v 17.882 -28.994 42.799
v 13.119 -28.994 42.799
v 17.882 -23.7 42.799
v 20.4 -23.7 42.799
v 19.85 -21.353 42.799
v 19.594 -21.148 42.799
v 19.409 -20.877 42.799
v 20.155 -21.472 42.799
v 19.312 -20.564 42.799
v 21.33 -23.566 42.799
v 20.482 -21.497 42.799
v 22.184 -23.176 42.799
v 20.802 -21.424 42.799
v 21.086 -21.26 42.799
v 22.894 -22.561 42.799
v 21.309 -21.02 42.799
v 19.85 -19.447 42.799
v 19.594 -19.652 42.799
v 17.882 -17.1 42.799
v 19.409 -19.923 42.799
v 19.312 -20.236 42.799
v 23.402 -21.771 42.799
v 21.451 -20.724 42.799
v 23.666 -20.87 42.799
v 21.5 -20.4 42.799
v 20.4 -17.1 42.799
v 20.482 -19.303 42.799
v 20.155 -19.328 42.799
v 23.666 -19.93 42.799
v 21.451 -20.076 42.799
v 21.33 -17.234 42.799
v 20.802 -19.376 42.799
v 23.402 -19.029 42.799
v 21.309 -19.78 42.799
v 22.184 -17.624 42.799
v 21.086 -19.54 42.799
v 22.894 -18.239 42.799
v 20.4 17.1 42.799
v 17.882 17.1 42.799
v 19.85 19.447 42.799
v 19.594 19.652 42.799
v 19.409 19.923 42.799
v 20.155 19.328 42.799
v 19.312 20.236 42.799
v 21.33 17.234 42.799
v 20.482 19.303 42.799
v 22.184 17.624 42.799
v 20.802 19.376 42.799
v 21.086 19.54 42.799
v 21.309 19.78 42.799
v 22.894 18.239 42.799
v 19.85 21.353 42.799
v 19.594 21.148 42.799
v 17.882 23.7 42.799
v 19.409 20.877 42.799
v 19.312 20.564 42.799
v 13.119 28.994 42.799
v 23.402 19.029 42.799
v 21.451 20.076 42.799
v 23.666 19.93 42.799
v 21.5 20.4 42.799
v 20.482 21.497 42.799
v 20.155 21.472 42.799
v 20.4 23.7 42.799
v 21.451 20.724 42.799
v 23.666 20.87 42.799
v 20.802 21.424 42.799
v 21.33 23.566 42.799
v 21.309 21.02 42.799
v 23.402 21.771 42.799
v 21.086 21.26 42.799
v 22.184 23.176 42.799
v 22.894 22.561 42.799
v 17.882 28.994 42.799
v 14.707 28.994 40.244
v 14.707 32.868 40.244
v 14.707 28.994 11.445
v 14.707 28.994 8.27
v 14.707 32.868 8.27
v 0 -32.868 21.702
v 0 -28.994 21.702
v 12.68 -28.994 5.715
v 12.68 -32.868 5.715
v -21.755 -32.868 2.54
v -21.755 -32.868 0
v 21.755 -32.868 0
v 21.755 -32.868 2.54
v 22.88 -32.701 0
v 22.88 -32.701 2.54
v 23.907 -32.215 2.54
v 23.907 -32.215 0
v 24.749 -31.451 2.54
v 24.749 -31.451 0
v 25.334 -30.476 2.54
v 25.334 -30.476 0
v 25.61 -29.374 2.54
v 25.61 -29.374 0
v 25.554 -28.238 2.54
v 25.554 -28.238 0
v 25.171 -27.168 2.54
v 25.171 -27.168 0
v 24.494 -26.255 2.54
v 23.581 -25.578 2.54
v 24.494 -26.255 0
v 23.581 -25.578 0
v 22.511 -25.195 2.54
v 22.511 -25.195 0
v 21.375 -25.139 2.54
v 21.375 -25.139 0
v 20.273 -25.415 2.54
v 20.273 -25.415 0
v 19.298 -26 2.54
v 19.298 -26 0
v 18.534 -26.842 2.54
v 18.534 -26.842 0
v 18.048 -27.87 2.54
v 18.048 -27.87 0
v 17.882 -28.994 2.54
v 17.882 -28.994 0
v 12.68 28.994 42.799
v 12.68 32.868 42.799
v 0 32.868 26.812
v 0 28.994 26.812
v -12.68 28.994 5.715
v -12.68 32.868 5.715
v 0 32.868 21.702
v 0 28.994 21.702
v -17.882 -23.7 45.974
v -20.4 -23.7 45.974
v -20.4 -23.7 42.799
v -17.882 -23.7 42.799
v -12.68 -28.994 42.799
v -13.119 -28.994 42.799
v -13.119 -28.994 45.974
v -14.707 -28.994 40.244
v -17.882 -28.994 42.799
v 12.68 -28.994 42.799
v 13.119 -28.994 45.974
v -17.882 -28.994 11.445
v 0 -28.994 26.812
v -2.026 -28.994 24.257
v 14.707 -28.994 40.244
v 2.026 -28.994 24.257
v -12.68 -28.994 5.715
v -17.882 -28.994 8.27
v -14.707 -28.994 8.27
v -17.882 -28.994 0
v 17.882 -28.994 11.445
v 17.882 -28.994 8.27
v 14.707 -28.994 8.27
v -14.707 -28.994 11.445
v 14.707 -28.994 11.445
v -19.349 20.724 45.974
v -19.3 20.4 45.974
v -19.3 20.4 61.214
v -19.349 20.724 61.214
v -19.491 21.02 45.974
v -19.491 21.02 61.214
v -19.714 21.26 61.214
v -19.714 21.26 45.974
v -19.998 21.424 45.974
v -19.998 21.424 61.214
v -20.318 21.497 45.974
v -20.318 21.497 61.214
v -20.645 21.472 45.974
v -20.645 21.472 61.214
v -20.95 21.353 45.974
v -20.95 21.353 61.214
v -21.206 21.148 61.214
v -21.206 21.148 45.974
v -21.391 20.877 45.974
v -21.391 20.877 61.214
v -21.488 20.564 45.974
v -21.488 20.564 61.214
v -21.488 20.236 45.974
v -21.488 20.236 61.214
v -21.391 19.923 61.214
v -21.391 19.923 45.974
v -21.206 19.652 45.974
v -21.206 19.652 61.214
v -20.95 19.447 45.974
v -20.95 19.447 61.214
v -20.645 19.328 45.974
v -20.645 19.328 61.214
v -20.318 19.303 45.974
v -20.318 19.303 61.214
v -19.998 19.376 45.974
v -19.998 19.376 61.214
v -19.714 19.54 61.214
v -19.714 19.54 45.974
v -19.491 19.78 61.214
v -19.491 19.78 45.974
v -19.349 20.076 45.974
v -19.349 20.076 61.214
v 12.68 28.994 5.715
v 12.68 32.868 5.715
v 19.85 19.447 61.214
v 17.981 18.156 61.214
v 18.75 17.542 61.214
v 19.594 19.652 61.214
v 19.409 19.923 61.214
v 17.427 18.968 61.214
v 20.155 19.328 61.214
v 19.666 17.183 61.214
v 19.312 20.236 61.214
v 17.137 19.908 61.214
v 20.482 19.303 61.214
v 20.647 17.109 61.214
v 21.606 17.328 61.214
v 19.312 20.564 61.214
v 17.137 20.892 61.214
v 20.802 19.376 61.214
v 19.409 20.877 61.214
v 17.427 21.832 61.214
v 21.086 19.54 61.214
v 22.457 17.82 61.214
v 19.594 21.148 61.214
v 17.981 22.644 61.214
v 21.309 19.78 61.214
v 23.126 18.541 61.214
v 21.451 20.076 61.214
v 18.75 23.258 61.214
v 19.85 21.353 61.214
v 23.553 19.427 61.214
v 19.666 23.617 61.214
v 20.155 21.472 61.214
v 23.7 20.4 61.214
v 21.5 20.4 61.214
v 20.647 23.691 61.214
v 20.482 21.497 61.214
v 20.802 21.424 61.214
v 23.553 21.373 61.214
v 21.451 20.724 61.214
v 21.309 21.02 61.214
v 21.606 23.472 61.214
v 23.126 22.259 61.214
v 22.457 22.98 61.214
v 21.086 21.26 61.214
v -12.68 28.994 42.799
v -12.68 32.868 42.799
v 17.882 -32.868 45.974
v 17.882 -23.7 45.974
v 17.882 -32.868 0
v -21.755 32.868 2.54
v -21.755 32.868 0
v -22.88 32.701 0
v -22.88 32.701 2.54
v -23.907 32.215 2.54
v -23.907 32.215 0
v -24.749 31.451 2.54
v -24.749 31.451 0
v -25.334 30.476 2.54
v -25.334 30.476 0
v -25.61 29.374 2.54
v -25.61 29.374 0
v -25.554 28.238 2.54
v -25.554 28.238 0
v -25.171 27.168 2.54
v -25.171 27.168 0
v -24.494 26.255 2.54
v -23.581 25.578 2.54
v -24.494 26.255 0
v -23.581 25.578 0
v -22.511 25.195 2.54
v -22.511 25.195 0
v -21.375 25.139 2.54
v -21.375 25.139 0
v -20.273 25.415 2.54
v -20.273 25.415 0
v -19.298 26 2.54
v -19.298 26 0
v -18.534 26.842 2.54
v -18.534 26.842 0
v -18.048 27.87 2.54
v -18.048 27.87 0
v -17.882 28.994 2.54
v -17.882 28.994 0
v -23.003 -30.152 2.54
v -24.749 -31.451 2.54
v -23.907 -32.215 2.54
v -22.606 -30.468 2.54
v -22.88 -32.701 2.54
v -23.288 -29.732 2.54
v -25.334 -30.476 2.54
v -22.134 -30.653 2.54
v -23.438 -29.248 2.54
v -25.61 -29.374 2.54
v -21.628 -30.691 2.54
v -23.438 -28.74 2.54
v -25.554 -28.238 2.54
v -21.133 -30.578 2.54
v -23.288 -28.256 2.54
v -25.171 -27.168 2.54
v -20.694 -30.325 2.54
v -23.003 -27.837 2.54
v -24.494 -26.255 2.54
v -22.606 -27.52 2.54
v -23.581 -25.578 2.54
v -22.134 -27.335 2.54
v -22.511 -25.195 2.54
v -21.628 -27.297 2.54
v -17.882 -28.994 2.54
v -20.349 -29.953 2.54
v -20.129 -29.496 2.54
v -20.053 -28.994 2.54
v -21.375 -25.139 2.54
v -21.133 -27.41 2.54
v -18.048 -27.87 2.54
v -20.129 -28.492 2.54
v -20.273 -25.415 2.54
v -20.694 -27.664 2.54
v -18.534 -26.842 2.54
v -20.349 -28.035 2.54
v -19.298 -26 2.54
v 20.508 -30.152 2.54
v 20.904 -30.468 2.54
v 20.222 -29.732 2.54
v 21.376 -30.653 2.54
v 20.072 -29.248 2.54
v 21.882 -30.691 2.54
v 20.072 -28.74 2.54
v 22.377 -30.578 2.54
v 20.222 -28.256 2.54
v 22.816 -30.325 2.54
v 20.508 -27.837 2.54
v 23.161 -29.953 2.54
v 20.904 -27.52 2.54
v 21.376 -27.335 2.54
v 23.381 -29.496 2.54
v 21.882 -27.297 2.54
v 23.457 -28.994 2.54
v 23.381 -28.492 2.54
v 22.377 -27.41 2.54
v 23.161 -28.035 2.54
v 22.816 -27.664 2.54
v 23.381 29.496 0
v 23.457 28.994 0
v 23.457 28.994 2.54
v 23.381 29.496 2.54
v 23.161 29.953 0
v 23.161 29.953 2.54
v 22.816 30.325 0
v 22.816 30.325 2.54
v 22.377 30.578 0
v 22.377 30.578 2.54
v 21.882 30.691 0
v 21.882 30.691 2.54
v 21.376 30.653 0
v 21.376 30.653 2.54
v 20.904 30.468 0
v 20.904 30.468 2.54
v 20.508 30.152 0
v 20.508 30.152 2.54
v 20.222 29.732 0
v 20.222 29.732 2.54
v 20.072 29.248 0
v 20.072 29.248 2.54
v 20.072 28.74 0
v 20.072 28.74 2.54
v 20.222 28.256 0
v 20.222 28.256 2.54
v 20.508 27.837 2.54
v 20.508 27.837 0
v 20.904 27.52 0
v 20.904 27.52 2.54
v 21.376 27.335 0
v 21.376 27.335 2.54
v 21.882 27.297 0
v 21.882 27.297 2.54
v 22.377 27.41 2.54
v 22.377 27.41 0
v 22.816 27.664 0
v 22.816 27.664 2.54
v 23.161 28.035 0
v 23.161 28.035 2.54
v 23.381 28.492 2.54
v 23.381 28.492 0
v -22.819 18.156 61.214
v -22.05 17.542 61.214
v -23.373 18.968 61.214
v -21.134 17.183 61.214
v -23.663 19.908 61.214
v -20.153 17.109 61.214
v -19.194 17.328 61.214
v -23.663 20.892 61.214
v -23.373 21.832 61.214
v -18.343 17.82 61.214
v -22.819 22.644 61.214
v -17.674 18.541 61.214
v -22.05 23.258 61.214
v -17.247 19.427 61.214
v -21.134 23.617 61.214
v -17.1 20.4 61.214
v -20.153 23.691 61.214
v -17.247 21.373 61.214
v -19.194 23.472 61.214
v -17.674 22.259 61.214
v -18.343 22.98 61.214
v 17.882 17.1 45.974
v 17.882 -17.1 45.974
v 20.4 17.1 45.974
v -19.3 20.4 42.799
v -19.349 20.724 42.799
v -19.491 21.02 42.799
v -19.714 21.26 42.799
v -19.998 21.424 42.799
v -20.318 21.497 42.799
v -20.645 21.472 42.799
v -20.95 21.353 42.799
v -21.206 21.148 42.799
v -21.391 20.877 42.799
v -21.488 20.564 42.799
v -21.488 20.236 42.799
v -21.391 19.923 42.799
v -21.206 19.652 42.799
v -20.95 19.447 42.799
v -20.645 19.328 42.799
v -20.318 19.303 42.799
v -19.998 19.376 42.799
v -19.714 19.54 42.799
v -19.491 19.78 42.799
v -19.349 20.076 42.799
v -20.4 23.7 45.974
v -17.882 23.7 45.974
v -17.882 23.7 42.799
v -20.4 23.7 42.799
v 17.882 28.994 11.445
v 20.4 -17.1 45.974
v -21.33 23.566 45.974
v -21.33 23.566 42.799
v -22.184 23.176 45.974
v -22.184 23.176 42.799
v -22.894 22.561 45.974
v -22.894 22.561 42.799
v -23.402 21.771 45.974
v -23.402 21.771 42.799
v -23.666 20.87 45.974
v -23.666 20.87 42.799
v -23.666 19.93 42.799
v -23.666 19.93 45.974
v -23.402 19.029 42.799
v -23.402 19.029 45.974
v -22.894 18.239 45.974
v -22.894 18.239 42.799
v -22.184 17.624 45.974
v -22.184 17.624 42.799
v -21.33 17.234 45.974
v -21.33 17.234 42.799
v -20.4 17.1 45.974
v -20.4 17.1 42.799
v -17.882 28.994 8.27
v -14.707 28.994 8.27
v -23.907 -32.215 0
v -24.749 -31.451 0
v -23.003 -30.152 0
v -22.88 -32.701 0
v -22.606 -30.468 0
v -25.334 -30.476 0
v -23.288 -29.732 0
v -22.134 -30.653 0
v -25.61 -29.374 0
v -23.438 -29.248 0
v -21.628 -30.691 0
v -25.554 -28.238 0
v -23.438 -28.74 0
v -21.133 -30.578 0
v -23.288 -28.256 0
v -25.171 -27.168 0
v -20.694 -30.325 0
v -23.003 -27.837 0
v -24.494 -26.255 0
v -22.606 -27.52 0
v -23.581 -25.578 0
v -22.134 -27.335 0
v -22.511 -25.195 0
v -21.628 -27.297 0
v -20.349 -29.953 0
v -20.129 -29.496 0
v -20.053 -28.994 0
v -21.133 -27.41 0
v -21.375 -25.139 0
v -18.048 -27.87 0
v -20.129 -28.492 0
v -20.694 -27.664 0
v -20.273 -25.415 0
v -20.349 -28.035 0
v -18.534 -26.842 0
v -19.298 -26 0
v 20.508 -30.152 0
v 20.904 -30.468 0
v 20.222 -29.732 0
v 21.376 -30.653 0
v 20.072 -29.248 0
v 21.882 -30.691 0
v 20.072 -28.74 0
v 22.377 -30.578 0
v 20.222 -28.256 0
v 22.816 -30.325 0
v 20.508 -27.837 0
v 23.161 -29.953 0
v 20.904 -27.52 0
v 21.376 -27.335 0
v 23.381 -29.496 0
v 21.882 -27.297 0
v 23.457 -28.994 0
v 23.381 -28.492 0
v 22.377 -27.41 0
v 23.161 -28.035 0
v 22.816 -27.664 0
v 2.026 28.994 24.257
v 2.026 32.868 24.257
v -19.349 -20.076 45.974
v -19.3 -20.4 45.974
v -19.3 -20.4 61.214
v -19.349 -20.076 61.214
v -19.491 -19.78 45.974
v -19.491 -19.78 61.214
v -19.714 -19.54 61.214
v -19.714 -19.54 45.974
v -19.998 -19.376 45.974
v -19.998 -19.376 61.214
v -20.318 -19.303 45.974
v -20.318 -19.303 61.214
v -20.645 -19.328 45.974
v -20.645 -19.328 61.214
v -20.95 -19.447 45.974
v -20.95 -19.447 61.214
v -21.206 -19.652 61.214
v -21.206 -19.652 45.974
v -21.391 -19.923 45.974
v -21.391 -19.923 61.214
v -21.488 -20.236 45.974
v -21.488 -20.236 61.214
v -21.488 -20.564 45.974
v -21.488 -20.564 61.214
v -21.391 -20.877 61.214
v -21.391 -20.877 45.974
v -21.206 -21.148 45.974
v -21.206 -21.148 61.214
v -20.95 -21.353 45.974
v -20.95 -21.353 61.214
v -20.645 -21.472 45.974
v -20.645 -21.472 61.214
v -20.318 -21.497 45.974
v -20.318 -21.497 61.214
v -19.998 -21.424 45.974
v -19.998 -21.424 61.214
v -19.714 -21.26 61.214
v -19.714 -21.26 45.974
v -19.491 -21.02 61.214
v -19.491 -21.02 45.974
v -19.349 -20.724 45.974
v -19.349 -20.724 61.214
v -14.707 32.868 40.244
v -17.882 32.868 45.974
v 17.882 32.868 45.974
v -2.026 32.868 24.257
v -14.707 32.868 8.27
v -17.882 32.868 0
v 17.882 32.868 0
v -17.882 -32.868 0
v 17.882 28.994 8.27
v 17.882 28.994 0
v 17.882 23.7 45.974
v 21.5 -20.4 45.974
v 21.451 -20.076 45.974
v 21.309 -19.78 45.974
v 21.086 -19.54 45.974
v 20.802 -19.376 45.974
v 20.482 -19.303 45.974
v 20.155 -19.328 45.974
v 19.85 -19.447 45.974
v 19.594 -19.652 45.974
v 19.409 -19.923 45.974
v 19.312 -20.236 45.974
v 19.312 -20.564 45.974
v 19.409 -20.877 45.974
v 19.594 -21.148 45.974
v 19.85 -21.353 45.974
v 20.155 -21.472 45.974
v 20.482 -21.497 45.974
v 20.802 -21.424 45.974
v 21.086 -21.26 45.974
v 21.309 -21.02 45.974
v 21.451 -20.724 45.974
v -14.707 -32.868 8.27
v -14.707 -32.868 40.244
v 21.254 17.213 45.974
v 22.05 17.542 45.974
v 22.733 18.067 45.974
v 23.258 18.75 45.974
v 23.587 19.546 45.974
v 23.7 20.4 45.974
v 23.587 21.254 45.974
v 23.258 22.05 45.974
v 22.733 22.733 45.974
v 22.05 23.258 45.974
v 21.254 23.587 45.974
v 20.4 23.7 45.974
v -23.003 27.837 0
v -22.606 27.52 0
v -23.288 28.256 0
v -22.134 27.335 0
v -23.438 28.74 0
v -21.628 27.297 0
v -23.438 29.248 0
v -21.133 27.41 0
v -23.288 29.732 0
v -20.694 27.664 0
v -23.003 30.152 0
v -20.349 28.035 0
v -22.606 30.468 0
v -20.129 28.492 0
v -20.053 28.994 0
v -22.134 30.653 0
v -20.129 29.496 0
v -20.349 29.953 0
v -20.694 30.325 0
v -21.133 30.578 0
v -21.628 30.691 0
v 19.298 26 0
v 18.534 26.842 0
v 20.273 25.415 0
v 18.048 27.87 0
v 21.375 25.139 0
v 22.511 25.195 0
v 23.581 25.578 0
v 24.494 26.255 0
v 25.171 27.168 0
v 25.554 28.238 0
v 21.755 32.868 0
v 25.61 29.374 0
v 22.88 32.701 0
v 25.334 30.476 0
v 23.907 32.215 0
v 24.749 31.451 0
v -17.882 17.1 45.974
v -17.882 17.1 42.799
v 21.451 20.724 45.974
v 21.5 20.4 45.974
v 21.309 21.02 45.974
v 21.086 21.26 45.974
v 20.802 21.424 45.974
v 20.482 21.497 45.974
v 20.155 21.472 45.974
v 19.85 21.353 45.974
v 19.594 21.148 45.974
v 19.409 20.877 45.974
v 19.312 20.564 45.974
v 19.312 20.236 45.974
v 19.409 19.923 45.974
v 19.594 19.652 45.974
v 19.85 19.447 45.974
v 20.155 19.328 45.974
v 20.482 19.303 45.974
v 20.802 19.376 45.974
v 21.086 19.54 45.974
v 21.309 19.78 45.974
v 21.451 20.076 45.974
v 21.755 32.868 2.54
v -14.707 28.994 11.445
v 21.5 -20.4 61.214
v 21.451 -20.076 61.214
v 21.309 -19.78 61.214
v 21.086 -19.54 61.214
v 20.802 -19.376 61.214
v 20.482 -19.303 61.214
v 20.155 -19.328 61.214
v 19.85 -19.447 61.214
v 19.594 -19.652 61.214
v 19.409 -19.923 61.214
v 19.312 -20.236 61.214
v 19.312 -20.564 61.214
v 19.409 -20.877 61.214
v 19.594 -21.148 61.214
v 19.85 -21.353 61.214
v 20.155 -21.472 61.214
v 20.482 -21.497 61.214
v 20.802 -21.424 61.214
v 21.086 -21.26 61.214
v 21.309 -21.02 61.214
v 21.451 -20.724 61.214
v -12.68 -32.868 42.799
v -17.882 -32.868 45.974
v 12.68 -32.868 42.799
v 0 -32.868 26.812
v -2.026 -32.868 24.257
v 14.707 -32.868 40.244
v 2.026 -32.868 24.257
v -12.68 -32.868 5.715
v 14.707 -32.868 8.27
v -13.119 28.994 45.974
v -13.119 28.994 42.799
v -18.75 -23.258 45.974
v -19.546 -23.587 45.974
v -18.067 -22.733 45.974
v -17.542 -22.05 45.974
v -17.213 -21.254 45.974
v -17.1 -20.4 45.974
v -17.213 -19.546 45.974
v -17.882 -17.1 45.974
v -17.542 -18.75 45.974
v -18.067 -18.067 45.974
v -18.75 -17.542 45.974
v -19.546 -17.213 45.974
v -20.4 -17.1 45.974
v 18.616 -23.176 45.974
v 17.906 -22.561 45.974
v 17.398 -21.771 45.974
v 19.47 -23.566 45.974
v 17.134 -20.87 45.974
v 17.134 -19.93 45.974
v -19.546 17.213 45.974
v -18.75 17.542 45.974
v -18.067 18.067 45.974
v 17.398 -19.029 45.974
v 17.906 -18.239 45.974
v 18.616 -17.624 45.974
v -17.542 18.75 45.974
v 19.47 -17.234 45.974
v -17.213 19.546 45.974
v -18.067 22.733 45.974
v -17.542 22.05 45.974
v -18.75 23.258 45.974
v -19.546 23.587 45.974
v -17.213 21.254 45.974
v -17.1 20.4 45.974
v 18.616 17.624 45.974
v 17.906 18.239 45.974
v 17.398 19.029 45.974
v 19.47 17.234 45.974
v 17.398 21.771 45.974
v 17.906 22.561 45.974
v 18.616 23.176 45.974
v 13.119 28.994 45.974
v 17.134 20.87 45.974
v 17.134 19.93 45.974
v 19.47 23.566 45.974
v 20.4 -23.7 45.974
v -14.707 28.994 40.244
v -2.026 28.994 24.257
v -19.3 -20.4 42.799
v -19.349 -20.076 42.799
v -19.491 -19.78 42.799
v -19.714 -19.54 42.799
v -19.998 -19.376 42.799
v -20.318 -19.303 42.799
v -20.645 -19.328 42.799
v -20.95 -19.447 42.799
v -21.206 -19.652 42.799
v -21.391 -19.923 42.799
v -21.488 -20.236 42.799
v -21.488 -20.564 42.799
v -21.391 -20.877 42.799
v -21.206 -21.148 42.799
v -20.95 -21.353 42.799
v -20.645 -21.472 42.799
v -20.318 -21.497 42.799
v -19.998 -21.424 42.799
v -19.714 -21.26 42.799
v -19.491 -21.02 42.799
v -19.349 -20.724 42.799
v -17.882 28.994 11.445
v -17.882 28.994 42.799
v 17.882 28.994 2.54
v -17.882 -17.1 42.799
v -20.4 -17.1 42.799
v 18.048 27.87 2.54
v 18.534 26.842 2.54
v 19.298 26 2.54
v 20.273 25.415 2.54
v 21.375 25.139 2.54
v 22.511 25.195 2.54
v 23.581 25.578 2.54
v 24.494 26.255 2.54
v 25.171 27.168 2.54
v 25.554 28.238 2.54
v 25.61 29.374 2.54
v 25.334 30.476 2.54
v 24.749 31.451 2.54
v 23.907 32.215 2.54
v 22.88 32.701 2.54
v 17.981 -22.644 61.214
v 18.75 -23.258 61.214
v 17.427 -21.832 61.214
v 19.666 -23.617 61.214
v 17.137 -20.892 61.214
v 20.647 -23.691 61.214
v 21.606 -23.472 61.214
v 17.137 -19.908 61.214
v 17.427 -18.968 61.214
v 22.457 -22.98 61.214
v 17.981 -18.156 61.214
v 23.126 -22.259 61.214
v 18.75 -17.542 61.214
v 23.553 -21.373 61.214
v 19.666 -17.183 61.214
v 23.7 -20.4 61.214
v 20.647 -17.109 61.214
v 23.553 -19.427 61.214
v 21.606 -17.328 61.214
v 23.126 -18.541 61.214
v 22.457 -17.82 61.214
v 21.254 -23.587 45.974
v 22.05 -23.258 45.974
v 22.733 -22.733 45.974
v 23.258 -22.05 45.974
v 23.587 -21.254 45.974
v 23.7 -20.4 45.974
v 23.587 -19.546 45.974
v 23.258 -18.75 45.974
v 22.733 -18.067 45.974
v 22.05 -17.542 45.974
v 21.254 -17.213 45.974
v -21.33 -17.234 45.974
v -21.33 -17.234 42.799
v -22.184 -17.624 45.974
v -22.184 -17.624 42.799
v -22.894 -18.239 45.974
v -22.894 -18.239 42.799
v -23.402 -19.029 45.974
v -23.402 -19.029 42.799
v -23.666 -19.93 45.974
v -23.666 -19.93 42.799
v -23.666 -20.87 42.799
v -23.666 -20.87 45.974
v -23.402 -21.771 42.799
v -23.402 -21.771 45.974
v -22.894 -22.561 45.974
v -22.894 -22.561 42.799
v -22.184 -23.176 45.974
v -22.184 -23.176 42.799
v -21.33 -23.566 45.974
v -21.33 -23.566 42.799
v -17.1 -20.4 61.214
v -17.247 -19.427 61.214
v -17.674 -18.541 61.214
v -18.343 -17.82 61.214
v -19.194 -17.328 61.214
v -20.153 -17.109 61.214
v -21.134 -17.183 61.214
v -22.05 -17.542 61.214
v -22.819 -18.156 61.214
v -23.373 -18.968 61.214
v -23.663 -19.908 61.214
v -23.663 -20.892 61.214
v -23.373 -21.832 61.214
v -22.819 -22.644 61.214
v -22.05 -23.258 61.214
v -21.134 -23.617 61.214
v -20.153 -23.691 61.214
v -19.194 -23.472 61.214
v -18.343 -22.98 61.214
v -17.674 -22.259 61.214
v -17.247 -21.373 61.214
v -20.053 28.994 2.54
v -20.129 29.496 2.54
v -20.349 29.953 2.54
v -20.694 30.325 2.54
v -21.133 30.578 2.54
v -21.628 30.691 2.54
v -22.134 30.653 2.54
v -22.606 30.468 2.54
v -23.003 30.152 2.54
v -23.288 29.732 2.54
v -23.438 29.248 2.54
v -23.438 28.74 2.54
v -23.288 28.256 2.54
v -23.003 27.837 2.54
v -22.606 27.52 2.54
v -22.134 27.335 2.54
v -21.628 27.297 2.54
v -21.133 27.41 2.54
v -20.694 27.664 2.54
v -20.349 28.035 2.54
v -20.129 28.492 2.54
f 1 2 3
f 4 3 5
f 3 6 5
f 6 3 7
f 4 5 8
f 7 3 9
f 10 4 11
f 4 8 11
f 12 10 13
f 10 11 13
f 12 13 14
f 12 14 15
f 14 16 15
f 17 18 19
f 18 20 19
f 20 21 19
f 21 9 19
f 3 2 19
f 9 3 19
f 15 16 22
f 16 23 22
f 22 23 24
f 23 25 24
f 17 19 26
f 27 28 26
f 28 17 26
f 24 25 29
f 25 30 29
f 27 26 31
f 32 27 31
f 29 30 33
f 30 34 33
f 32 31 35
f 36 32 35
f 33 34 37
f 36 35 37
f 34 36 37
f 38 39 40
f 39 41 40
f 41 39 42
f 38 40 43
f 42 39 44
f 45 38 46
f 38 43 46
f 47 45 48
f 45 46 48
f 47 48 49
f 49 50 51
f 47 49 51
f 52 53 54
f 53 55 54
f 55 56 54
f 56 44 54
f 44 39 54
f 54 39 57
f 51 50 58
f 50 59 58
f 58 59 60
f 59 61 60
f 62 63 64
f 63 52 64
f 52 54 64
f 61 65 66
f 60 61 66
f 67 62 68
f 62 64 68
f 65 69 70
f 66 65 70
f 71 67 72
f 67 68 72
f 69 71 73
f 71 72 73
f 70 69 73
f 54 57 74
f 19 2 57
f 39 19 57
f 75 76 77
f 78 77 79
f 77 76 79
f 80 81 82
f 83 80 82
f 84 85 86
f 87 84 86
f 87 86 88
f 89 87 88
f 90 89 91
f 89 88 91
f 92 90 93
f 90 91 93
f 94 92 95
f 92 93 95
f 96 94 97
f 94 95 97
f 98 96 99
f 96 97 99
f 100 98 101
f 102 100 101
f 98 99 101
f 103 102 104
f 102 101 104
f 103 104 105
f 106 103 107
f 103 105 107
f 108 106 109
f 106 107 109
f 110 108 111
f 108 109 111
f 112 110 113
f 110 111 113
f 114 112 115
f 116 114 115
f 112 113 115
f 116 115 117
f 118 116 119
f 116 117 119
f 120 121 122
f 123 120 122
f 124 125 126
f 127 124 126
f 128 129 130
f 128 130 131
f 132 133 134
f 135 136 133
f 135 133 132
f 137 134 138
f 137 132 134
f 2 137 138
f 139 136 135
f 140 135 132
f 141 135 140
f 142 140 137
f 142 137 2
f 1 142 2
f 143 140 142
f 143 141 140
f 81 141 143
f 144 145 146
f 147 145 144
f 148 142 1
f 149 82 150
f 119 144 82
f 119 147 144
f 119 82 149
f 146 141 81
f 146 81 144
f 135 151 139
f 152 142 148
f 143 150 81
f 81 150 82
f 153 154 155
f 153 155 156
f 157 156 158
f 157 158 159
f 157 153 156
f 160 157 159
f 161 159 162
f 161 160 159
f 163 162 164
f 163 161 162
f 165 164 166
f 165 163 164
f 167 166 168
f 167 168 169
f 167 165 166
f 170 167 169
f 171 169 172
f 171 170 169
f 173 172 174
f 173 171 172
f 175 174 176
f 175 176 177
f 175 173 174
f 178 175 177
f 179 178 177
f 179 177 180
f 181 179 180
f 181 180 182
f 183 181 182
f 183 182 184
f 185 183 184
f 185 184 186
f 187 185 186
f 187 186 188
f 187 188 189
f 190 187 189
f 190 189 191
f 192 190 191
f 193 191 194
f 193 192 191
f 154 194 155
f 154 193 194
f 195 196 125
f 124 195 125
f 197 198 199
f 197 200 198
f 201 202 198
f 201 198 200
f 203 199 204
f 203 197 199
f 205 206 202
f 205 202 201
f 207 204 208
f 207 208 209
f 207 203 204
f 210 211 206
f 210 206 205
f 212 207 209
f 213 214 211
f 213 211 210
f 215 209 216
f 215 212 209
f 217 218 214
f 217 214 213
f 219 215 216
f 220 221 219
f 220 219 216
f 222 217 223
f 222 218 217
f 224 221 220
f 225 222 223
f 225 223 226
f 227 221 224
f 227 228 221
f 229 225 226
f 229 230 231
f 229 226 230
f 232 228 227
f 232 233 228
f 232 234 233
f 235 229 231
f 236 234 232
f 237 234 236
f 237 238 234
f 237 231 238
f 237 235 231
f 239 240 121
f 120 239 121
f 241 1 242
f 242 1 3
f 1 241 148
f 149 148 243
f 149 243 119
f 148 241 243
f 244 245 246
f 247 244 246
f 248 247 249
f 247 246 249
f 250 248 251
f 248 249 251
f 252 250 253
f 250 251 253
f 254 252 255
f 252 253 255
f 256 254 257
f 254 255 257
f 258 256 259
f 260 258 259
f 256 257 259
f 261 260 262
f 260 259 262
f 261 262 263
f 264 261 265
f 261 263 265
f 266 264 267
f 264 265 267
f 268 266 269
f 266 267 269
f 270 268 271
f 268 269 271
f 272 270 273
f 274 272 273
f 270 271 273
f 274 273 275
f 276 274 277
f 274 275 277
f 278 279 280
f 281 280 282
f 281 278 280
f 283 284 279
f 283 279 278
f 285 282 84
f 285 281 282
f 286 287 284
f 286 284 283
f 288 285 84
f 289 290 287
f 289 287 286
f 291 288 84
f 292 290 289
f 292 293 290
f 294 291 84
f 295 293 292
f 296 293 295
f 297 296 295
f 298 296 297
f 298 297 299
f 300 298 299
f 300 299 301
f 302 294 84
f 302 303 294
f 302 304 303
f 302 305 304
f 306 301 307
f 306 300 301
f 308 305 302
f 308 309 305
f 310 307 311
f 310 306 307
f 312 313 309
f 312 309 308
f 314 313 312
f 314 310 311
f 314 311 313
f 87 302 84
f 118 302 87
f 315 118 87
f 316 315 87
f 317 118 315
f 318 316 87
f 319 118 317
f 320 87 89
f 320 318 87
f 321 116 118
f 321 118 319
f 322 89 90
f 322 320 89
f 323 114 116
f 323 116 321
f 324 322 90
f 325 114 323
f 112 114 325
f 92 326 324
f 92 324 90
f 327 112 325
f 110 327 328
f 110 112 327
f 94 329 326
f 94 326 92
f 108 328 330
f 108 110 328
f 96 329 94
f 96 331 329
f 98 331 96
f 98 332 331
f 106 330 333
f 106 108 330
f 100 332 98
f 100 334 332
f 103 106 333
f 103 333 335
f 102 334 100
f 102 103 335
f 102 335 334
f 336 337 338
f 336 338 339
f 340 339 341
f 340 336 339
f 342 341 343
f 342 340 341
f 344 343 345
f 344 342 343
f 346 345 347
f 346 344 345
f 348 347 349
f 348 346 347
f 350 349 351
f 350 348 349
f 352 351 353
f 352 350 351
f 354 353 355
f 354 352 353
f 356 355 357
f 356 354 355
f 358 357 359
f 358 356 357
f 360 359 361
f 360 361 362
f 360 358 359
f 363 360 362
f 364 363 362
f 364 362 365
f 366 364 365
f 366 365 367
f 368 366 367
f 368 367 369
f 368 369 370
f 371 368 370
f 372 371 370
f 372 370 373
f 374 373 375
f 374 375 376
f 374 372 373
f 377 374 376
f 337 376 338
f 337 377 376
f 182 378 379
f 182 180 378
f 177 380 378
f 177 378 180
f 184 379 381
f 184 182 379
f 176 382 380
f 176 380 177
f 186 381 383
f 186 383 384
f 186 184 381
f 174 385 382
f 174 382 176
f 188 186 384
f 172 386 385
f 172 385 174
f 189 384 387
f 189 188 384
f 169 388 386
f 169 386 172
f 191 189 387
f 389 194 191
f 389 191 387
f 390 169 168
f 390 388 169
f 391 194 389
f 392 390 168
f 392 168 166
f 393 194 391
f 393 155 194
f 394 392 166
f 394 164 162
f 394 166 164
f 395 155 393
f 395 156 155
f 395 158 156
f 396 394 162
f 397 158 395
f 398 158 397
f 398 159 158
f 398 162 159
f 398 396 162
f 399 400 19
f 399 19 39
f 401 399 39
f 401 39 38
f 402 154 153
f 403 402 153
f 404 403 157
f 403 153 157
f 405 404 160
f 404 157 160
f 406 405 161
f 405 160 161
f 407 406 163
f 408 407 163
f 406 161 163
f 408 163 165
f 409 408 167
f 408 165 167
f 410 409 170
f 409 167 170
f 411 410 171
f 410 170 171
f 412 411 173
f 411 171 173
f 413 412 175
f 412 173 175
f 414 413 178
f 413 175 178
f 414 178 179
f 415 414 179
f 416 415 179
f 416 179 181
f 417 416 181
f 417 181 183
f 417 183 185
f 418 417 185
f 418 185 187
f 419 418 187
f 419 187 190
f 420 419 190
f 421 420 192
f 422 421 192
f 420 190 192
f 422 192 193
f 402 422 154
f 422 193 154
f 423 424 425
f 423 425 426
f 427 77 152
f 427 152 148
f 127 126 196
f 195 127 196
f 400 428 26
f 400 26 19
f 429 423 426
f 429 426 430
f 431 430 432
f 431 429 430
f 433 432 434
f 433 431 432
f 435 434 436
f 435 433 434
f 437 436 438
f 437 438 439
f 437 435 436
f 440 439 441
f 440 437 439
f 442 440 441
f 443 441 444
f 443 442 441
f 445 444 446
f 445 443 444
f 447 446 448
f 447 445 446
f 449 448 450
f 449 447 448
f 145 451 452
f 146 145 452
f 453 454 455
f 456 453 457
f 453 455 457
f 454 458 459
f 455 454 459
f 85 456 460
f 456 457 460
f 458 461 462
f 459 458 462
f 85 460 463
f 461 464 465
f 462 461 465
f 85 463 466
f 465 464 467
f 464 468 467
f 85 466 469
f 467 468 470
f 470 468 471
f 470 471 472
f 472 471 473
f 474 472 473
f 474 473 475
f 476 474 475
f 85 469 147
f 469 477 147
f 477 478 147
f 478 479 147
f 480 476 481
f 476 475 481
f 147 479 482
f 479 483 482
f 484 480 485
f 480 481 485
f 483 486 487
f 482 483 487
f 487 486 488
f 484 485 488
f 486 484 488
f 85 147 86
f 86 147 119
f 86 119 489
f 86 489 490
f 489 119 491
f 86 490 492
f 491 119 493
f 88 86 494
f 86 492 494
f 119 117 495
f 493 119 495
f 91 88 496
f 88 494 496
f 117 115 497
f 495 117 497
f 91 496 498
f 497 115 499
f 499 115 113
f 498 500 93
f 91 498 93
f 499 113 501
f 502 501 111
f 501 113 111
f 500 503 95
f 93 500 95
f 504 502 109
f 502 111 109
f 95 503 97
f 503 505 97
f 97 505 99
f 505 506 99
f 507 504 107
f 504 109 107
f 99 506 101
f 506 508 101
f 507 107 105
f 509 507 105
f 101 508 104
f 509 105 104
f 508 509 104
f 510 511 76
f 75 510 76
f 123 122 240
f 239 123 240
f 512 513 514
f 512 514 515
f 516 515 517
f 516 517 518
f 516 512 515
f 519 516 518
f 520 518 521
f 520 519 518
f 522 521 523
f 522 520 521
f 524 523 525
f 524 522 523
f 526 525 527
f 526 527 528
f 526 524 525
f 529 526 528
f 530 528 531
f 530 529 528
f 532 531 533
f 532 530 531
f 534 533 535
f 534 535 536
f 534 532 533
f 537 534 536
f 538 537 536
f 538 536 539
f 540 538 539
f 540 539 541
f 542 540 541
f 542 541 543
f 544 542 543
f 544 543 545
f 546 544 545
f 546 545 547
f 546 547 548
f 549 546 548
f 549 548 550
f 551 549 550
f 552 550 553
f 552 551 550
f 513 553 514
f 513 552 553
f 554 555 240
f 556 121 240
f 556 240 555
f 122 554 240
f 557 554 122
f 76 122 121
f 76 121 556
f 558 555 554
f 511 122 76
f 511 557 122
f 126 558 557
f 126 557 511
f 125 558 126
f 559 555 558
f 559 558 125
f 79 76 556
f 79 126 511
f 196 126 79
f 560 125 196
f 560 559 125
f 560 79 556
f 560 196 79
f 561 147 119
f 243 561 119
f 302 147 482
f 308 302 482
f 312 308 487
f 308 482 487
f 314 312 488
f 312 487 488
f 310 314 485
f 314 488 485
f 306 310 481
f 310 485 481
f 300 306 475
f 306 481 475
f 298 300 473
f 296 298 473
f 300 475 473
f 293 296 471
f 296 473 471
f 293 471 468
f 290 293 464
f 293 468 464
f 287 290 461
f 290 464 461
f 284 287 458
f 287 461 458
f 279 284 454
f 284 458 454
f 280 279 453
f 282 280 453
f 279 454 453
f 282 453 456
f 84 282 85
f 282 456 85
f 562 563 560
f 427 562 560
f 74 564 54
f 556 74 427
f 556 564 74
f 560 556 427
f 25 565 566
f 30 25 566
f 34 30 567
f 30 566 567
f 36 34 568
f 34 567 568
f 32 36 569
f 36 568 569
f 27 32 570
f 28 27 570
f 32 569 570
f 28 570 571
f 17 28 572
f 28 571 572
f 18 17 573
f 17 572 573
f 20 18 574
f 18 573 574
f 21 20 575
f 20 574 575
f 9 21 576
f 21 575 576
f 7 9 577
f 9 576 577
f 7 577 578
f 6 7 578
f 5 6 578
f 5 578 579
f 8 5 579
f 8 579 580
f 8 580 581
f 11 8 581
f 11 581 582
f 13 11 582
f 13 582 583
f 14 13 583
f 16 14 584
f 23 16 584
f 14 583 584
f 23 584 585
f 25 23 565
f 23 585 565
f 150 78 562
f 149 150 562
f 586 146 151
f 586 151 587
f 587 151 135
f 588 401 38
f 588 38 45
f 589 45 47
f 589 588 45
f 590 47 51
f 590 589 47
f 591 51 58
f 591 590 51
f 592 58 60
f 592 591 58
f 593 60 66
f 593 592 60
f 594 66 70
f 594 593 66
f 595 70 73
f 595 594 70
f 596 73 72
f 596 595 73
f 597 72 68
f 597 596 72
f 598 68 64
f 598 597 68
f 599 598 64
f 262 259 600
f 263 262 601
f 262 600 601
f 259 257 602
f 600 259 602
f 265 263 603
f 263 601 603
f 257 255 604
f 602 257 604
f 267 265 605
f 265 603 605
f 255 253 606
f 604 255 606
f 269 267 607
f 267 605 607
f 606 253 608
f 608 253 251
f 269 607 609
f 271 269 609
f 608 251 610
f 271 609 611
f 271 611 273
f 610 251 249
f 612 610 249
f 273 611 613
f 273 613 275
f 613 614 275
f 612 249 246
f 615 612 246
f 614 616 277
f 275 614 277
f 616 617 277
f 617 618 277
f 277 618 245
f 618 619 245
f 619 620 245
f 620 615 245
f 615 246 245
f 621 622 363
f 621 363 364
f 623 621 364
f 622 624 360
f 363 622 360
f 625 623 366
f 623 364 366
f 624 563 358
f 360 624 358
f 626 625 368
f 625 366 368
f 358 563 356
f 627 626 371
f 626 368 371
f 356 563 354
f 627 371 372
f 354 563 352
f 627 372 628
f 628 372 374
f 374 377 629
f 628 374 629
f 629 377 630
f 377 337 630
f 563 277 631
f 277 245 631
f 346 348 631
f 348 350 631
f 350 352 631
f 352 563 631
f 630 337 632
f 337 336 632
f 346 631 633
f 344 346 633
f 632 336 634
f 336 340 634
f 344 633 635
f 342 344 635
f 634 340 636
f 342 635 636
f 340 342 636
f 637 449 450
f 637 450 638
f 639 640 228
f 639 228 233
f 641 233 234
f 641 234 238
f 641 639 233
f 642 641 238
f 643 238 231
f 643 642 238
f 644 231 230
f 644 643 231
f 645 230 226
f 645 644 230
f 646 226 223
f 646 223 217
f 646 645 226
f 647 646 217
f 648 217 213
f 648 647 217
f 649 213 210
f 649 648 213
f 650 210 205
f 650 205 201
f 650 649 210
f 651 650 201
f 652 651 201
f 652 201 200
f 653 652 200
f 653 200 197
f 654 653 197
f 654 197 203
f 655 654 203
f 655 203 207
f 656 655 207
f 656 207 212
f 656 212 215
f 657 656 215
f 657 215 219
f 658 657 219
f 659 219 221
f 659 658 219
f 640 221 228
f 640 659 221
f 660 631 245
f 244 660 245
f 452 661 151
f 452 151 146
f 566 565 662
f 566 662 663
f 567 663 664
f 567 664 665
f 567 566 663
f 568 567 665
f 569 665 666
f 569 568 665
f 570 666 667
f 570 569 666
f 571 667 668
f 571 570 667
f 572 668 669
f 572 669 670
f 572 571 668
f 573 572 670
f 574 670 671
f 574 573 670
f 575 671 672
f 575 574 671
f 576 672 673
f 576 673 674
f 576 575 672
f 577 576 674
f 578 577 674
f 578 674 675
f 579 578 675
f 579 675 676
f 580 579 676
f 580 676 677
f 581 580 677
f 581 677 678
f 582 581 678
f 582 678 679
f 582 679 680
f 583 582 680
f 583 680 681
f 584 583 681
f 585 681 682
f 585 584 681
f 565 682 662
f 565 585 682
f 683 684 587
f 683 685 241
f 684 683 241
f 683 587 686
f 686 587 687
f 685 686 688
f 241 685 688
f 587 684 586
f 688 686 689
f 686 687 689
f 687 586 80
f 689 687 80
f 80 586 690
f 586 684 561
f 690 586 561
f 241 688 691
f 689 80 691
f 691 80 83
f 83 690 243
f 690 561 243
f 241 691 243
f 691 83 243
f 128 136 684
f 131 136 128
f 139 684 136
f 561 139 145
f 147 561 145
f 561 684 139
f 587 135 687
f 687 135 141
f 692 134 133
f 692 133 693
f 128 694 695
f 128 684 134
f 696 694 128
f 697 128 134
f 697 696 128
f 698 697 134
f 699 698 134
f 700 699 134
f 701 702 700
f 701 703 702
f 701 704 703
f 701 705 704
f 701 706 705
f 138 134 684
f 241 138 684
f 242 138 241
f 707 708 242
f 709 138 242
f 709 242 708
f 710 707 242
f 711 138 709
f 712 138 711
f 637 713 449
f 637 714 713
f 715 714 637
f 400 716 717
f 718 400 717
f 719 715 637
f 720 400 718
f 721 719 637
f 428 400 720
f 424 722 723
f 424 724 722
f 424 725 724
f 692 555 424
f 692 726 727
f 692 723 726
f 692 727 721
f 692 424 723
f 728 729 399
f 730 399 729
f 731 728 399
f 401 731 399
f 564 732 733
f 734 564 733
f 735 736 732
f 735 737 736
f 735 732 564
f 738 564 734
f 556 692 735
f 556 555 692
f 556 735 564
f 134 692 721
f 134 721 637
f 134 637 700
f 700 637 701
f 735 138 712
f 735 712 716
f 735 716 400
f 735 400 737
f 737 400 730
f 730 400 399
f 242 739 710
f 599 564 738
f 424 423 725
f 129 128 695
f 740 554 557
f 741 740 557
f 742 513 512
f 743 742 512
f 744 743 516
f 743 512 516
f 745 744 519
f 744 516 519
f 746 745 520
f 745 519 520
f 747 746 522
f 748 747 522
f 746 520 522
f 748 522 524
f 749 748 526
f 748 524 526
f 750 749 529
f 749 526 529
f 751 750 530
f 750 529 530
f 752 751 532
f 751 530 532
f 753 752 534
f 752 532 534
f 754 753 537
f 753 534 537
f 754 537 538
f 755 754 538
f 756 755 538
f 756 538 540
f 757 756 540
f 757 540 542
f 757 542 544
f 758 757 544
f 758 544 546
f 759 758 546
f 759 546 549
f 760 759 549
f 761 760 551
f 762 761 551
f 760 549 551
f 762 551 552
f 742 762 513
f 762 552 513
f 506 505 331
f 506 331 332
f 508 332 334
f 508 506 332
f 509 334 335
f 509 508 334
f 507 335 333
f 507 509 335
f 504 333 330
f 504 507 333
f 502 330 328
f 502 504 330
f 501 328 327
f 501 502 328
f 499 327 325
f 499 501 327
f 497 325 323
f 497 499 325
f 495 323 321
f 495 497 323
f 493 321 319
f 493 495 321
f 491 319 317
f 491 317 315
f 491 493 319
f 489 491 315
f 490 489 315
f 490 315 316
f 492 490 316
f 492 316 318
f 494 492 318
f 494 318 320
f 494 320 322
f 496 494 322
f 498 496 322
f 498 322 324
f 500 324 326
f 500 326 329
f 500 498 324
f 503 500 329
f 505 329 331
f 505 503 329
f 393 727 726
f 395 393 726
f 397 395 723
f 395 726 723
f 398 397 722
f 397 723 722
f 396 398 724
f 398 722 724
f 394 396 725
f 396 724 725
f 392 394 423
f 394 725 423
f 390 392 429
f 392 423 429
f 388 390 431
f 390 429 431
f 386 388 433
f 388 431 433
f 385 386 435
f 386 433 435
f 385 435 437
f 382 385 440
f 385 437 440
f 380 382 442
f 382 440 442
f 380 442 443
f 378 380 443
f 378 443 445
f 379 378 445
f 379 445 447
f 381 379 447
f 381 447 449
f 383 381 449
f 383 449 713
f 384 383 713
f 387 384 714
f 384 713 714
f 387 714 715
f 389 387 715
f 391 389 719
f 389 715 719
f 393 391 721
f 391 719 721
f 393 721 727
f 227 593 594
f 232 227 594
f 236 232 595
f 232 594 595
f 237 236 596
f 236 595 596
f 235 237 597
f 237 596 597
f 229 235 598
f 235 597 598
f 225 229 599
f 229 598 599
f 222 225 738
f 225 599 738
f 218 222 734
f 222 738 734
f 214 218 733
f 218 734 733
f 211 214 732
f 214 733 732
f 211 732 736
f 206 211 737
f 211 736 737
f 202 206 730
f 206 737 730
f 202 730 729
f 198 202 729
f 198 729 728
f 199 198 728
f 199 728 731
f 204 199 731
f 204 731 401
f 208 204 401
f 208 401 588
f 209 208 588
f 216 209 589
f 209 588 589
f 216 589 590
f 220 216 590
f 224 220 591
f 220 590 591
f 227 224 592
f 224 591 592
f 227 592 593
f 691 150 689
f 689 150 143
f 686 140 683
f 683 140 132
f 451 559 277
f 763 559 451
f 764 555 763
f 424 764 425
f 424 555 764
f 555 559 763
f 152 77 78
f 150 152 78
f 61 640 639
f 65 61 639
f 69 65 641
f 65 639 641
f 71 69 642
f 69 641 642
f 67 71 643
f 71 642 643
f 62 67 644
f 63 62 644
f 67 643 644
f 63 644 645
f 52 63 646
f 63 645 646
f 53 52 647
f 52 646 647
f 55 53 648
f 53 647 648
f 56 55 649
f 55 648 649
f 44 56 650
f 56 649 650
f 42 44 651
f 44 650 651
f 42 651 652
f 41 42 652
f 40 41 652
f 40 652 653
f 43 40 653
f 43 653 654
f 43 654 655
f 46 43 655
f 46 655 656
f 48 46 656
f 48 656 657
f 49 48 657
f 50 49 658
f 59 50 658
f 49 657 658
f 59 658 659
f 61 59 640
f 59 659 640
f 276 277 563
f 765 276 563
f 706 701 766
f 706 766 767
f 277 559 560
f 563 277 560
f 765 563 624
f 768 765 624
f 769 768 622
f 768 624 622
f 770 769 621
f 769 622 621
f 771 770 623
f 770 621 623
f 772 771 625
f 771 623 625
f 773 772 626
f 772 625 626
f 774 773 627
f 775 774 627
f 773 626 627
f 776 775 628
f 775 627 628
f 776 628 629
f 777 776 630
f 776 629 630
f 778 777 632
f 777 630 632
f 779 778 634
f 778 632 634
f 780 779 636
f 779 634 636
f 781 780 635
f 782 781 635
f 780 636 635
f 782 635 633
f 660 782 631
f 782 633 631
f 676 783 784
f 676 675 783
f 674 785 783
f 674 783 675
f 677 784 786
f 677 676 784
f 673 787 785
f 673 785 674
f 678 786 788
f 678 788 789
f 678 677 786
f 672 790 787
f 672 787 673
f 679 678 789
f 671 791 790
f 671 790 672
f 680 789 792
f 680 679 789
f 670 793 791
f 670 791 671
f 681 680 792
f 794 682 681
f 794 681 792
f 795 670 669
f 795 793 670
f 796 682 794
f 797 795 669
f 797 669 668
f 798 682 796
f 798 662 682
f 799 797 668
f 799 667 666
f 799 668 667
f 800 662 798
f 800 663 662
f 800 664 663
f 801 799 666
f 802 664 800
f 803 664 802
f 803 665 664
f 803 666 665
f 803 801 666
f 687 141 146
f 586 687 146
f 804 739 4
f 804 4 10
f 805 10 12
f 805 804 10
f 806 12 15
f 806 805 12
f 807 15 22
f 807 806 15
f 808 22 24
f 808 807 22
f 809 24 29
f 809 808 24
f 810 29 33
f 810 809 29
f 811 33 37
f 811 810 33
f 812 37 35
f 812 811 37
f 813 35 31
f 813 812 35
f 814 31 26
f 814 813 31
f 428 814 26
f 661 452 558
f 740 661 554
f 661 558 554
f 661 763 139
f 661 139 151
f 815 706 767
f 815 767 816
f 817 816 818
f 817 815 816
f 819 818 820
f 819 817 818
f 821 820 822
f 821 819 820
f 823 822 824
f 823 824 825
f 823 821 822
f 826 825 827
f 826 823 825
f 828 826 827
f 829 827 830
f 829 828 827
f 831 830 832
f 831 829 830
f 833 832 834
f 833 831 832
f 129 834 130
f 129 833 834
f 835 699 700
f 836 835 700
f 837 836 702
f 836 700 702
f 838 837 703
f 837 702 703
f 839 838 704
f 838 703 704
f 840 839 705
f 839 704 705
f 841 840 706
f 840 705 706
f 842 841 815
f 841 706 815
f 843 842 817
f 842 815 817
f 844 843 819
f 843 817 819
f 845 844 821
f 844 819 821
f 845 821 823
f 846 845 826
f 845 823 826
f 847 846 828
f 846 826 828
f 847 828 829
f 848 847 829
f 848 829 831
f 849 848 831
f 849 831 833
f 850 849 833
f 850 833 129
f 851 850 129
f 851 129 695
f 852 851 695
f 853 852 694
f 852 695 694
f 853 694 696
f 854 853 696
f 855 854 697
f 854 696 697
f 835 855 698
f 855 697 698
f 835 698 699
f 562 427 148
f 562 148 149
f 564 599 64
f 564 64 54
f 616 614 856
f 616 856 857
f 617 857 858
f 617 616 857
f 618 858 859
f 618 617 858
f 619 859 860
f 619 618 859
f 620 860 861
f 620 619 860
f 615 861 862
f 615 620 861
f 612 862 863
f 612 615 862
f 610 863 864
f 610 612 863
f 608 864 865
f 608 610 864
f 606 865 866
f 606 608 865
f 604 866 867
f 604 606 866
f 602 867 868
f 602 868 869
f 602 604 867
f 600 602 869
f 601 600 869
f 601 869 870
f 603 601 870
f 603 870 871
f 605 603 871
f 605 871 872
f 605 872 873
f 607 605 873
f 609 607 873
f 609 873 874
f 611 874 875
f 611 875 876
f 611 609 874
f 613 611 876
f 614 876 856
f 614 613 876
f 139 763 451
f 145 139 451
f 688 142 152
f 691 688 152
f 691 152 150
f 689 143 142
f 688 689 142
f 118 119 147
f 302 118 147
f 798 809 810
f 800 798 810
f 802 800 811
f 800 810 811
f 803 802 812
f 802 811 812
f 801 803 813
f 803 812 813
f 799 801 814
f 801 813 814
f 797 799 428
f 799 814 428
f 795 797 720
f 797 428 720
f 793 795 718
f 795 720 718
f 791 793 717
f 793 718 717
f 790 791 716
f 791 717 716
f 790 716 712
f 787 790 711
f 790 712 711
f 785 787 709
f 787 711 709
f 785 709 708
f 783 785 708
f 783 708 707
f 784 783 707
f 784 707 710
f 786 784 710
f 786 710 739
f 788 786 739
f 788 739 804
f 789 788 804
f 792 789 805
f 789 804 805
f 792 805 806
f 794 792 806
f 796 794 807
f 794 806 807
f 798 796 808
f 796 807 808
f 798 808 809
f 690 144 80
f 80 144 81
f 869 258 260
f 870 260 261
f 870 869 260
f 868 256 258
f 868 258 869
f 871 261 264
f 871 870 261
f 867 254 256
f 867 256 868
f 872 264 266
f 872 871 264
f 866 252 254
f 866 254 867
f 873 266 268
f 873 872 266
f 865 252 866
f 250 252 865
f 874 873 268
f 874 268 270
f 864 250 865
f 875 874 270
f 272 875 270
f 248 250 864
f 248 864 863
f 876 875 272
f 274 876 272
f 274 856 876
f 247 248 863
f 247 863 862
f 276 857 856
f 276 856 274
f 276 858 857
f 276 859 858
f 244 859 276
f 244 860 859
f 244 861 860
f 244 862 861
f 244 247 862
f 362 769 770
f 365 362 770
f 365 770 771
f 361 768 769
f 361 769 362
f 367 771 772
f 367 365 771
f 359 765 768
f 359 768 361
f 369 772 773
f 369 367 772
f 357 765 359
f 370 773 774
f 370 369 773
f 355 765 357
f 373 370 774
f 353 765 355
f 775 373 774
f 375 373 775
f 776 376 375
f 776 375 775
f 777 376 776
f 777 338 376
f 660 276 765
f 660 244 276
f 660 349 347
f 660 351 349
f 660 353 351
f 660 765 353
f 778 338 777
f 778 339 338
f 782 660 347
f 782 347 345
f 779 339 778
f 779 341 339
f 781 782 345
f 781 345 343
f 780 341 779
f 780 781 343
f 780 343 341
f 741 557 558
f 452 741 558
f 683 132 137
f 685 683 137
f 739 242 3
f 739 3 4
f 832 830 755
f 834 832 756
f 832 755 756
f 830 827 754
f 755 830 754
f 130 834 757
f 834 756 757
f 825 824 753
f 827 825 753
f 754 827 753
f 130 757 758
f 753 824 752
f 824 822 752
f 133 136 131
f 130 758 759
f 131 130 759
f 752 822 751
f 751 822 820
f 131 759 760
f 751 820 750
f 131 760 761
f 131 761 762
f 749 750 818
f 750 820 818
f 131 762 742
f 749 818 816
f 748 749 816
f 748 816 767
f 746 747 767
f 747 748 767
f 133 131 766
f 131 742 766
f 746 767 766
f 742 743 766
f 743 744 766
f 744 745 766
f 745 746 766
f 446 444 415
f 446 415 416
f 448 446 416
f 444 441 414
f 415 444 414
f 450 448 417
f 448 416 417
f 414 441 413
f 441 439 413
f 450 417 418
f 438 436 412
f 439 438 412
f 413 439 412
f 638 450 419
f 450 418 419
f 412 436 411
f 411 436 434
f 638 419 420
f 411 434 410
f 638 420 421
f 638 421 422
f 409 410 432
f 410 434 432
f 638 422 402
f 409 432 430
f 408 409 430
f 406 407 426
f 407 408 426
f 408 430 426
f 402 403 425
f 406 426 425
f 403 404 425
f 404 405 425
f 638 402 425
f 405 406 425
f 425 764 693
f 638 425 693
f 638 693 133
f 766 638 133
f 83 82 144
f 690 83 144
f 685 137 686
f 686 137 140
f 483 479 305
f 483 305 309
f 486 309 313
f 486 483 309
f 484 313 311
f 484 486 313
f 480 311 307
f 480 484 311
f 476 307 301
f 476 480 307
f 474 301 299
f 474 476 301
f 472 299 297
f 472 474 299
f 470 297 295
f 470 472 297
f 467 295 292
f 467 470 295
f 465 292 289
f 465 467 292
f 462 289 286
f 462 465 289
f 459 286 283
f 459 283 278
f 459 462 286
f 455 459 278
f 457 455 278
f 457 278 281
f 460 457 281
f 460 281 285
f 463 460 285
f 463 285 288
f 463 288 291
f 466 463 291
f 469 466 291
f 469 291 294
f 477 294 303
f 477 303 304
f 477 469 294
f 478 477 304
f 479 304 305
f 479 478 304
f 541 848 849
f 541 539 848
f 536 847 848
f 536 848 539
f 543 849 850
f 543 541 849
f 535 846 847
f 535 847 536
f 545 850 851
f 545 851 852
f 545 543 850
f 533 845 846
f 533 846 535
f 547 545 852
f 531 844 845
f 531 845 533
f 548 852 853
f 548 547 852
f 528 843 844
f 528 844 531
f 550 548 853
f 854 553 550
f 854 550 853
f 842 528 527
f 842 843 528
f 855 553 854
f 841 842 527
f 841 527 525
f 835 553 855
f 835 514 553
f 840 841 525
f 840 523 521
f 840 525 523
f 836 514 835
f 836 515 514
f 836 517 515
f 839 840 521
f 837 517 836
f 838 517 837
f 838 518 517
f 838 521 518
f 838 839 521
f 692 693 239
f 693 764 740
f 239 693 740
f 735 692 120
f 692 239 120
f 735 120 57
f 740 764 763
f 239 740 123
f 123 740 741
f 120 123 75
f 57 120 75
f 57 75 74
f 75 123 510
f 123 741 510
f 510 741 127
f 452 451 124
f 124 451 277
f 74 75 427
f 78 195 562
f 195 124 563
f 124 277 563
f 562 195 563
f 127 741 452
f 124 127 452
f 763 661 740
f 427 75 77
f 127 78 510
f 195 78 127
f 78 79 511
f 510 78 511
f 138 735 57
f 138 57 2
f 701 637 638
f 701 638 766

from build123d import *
from build123d.topology import SkipClean

# Parameters (mm, degrees)
SKETCH1_R             = 1.7018
BOSS_EXTRUDE2_DEPTH   = 2.54
BOSS_EXTRUDE2_2_DEPTH = 2.54
BOSS_EXTRUDE3_START   = -2.54
SKETCH2_W             = 35.7632
SKETCH2_H             = 3.8735
BOSS_EXTRUDE3_DEPTH   = 45.974
BOSS_EXTRUDE3_2_DEPTH = 45.974
CUT_EXTRUDE3_DEPTH    = 85.211343256
BOSS_EXTRUDE4_START   = 45.974
SKETCH7_R             = 1.099947
BOSS_EXTRUDE4_DEPTH   = 3.175
SKETCH8_R             = 3.299841
SKETCH8_R_2           = 1.099947
BOSS_EXTRUDE5_DEPTH   = 15.24
BOSS_EXTRUDE6_START   = -3.8735
SKETCH9_W             = 3.175
SKETCH9_H             = 3.175
BOSS_EXTRUDE6_DEPTH   = 57.9882


with BuildPart() as part:
    # Sketch1 → Boss-Extrude2 (new body)
    with BuildSketch(Plane.XY):
        with BuildLine():
            Line((21.7551, 32.8676), (-21.7551, 32.8676))
            ThreePointArc((-21.7551, 32.8676), (-24.494078117, 26.255121883), (-17.8816, 28.9941))
            Line((-17.8816, 28.9941), (17.8816, 28.9941))
            ThreePointArc((17.8816, 28.9941), (24.494078117, 26.255121883), (21.7551, 32.8676))
        make_face()
        with Locations((-21.7551, 28.9941)):
            Circle(SKETCH1_R, mode=Mode.SUBTRACT)
        with Locations((21.7551, 28.9941)):
            Circle(SKETCH1_R, mode=Mode.SUBTRACT)
    extrude(amount=BOSS_EXTRUDE2_DEPTH)


with BuildPart() as body_2:
    # Sketch1 → Boss-Extrude2 2 (new body)
    with BuildSketch(Plane.XY):
        with BuildLine():
            Line((17.8816, -28.9941), (-17.8816, -28.9941))
            ThreePointArc((-17.8816, -28.9941), (-24.494078117, -26.255121883), (-21.7551, -32.8676))
            Line((-21.7551, -32.8676), (21.7551, -32.8676))
            ThreePointArc((21.7551, -32.8676), (24.494078117, -26.255121883), (17.8816, -28.9941))
        make_face()
        with Locations((-21.7551, -28.9941)):
            Circle(SKETCH1_R, mode=Mode.SUBTRACT)
        with Locations((21.7551, -28.9941)):
            Circle(SKETCH1_R, mode=Mode.SUBTRACT)
    extrude(amount=BOSS_EXTRUDE2_2_DEPTH)


with BuildPart() as body_3:
    # Sketch2 → Boss-Extrude3 (new body)
    with BuildSketch(Plane.XY.offset(2.54).offset(BOSS_EXTRUDE3_START)):
        with Locations((0, 30.93085)):
            Rectangle(SKETCH2_W, SKETCH2_H)
    extrude(amount=BOSS_EXTRUDE3_DEPTH)


with BuildPart() as body_4:
    # Sketch2 → Boss-Extrude3 2 (new body)
    with BuildSketch(Plane.XY.offset(2.54).offset(BOSS_EXTRUDE3_START)):
        with Locations((0, -30.93085)):
            Rectangle(SKETCH2_W, SKETCH2_H)
    extrude(amount=BOSS_EXTRUDE3_2_DEPTH)


with BuildPart() as cut_extrude3_tool:
    # Sketch6 → Cut-Extrude3 (new, through all)
    with BuildSketch(Plane(origin=(0, 32.8676, 0), x_dir=(1, 0, 0), z_dir=(0, 1, 0))):
        Polygon((-14.7066, -40.244356495), (-2.026217246, -24.257), (-14.7066, -8.269643505), align=None)
        Polygon((-12.680382754, -5.715), (0, -21.702356495), (12.680382754, -5.715), align=None)
        Polygon((14.7066, -8.269643505), (2.026217246, -24.257), (14.7066, -40.244356495), align=None)
        Polygon((0, -26.811643505), (-12.680382754, -42.799), (12.680382754, -42.799), align=None)
    extrude(amount=-CUT_EXTRUDE3_DEPTH)


with BuildPart() as body_3_1:
    add(body_3.part)

    # Cut-Extrude3: cut by cut_extrude3_tool
    add(cut_extrude3_tool.part, mode=Mode.SUBTRACT)



with BuildPart() as body_4_1:
    add(body_4.part)

    # Cut-Extrude3: cut by cut_extrude3_tool
    add(cut_extrude3_tool.part, mode=Mode.SUBTRACT)


with BuildPart() as body_3_2:
    add(body_3_1.part)

    add(body_4_1.part)  # Boss-Extrude4 merges body 4
    # Sketch7 → Boss-Extrude4 (add)
    # profile 1 of 2: a face of its own
    with BuildSketch(Plane.XY.offset(BOSS_EXTRUDE4_START)):
        with BuildLine():
            Line((-13.1191, -32.8676), (-13.1191, 32.8676))
            Line((-13.1191, 32.8676), (-17.8816, 32.8676))
            Line((-17.8816, 32.8676), (-17.8816, 23.699851))
            Line((-17.8816, 23.699851), (-20.40001, 23.699851))
            ThreePointArc((-20.40001, 23.699851), (-23.699851, 20.40001), (-20.40001, 17.100169))
            Line((-20.40001, 17.100169), (-17.8816, 17.100169))
            Line((-17.8816, 17.100169), (-17.8816, -17.100169))
            Line((-17.8816, -17.100169), (-20.40001, -17.100169))
            ThreePointArc((-20.40001, -17.100169), (-23.699851, -20.40001), (-20.40001, -23.699851))
            Line((-20.40001, -23.699851), (-17.8816, -23.699851))
            Line((-17.8816, -23.699851), (-17.8816, -32.8676))
            Line((-17.8816, -32.8676), (-13.1191, -32.8676))
        make_face()
        with Locations((-20.40001, -20.40001)):
            Circle(SKETCH7_R, mode=Mode.SUBTRACT)
        with Locations((-20.40001, 20.40001)):
            Circle(SKETCH7_R, mode=Mode.SUBTRACT)
    # profile 2 of 2: a face of its own
    with BuildSketch(Plane.XY.offset(BOSS_EXTRUDE4_START)):
        with BuildLine():
            Line((17.8816, 32.8676), (13.1191, 32.8676))
            Line((13.1191, 32.8676), (13.1191, -32.8676))
            Line((13.1191, -32.8676), (17.8816, -32.8676))
            Line((17.8816, -32.8676), (17.8816, -23.699851))
            Line((17.8816, -23.699851), (20.40001, -23.699851))
            ThreePointArc((20.40001, -23.699851), (23.699851, -20.40001), (20.40001, -17.100169))
            Line((20.40001, -17.100169), (17.8816, -17.100169))
            Line((17.8816, -17.100169), (17.8816, 17.100169))
            Line((17.8816, 17.100169), (20.40001, 17.100169))
            ThreePointArc((20.40001, 17.100169), (23.699851, 20.40001), (20.40001, 23.699851))
            Line((20.40001, 23.699851), (17.8816, 23.699851))
            Line((17.8816, 23.699851), (17.8816, 32.8676))
        make_face()
        with Locations((20.40001, 20.40001)):
            Circle(SKETCH7_R, mode=Mode.SUBTRACT)
        with Locations((20.40001, -20.40001)):
            Circle(SKETCH7_R, mode=Mode.SUBTRACT)
    extrude(amount=-BOSS_EXTRUDE4_DEPTH)

    # Sketch8 → Boss-Extrude5 (add)
    # profile 1 of 4: a face of its own
    with SkipClean():  # the faces are left unmerged after this step: merging them gives an invalid solid
        with BuildSketch(Plane.XY.offset(45.974)):
            with Locations((-20.40001, 20.40001)):
                Circle(SKETCH8_R)
            with Locations((-20.40001, 20.40001)):
                Circle(SKETCH8_R_2, mode=Mode.SUBTRACT)
        # profile 2 of 4: a face of its own
        with BuildSketch(Plane.XY.offset(45.974)):
            with Locations((20.40001, 20.40001)):
                Circle(SKETCH8_R)
            with Locations((20.40001, 20.40001)):
                Circle(SKETCH8_R_2, mode=Mode.SUBTRACT)
        # profile 3 of 4: a face of its own
        with BuildSketch(Plane.XY.offset(45.974)):
            with Locations((20.40001, -20.40001)):
                Circle(SKETCH8_R)
            with Locations((20.40001, -20.40001)):
                Circle(SKETCH8_R_2, mode=Mode.SUBTRACT)
        # profile 4 of 4: a face of its own
        with BuildSketch(Plane.XY.offset(45.974)):
            with Locations((-20.40001, -20.40001)):
                Circle(SKETCH8_R)
            with Locations((-20.40001, -20.40001)):
                Circle(SKETCH8_R_2, mode=Mode.SUBTRACT)
        extrude(amount=BOSS_EXTRUDE5_DEPTH)

    # Sketch9 → Boss-Extrude6 (add)
    with SkipClean():  # the faces are left unmerged after this step: merging them gives an invalid solid
        with BuildSketch(Plane(origin=(0, 32.8676, 0), x_dir=(1, 0, 0), z_dir=(0, 1, 0)).offset(BOSS_EXTRUDE6_START)):
            with Locations((-16.2941, -9.857143505)):
                Rectangle(SKETCH9_W, SKETCH9_H)
            with Locations((16.2941, -9.857143505)):
                Rectangle(SKETCH9_W, SKETCH9_H)
        extrude(amount=-BOSS_EXTRUDE6_DEPTH)


solid = Compound([part.part, body_2.part, body_3_2.part])
